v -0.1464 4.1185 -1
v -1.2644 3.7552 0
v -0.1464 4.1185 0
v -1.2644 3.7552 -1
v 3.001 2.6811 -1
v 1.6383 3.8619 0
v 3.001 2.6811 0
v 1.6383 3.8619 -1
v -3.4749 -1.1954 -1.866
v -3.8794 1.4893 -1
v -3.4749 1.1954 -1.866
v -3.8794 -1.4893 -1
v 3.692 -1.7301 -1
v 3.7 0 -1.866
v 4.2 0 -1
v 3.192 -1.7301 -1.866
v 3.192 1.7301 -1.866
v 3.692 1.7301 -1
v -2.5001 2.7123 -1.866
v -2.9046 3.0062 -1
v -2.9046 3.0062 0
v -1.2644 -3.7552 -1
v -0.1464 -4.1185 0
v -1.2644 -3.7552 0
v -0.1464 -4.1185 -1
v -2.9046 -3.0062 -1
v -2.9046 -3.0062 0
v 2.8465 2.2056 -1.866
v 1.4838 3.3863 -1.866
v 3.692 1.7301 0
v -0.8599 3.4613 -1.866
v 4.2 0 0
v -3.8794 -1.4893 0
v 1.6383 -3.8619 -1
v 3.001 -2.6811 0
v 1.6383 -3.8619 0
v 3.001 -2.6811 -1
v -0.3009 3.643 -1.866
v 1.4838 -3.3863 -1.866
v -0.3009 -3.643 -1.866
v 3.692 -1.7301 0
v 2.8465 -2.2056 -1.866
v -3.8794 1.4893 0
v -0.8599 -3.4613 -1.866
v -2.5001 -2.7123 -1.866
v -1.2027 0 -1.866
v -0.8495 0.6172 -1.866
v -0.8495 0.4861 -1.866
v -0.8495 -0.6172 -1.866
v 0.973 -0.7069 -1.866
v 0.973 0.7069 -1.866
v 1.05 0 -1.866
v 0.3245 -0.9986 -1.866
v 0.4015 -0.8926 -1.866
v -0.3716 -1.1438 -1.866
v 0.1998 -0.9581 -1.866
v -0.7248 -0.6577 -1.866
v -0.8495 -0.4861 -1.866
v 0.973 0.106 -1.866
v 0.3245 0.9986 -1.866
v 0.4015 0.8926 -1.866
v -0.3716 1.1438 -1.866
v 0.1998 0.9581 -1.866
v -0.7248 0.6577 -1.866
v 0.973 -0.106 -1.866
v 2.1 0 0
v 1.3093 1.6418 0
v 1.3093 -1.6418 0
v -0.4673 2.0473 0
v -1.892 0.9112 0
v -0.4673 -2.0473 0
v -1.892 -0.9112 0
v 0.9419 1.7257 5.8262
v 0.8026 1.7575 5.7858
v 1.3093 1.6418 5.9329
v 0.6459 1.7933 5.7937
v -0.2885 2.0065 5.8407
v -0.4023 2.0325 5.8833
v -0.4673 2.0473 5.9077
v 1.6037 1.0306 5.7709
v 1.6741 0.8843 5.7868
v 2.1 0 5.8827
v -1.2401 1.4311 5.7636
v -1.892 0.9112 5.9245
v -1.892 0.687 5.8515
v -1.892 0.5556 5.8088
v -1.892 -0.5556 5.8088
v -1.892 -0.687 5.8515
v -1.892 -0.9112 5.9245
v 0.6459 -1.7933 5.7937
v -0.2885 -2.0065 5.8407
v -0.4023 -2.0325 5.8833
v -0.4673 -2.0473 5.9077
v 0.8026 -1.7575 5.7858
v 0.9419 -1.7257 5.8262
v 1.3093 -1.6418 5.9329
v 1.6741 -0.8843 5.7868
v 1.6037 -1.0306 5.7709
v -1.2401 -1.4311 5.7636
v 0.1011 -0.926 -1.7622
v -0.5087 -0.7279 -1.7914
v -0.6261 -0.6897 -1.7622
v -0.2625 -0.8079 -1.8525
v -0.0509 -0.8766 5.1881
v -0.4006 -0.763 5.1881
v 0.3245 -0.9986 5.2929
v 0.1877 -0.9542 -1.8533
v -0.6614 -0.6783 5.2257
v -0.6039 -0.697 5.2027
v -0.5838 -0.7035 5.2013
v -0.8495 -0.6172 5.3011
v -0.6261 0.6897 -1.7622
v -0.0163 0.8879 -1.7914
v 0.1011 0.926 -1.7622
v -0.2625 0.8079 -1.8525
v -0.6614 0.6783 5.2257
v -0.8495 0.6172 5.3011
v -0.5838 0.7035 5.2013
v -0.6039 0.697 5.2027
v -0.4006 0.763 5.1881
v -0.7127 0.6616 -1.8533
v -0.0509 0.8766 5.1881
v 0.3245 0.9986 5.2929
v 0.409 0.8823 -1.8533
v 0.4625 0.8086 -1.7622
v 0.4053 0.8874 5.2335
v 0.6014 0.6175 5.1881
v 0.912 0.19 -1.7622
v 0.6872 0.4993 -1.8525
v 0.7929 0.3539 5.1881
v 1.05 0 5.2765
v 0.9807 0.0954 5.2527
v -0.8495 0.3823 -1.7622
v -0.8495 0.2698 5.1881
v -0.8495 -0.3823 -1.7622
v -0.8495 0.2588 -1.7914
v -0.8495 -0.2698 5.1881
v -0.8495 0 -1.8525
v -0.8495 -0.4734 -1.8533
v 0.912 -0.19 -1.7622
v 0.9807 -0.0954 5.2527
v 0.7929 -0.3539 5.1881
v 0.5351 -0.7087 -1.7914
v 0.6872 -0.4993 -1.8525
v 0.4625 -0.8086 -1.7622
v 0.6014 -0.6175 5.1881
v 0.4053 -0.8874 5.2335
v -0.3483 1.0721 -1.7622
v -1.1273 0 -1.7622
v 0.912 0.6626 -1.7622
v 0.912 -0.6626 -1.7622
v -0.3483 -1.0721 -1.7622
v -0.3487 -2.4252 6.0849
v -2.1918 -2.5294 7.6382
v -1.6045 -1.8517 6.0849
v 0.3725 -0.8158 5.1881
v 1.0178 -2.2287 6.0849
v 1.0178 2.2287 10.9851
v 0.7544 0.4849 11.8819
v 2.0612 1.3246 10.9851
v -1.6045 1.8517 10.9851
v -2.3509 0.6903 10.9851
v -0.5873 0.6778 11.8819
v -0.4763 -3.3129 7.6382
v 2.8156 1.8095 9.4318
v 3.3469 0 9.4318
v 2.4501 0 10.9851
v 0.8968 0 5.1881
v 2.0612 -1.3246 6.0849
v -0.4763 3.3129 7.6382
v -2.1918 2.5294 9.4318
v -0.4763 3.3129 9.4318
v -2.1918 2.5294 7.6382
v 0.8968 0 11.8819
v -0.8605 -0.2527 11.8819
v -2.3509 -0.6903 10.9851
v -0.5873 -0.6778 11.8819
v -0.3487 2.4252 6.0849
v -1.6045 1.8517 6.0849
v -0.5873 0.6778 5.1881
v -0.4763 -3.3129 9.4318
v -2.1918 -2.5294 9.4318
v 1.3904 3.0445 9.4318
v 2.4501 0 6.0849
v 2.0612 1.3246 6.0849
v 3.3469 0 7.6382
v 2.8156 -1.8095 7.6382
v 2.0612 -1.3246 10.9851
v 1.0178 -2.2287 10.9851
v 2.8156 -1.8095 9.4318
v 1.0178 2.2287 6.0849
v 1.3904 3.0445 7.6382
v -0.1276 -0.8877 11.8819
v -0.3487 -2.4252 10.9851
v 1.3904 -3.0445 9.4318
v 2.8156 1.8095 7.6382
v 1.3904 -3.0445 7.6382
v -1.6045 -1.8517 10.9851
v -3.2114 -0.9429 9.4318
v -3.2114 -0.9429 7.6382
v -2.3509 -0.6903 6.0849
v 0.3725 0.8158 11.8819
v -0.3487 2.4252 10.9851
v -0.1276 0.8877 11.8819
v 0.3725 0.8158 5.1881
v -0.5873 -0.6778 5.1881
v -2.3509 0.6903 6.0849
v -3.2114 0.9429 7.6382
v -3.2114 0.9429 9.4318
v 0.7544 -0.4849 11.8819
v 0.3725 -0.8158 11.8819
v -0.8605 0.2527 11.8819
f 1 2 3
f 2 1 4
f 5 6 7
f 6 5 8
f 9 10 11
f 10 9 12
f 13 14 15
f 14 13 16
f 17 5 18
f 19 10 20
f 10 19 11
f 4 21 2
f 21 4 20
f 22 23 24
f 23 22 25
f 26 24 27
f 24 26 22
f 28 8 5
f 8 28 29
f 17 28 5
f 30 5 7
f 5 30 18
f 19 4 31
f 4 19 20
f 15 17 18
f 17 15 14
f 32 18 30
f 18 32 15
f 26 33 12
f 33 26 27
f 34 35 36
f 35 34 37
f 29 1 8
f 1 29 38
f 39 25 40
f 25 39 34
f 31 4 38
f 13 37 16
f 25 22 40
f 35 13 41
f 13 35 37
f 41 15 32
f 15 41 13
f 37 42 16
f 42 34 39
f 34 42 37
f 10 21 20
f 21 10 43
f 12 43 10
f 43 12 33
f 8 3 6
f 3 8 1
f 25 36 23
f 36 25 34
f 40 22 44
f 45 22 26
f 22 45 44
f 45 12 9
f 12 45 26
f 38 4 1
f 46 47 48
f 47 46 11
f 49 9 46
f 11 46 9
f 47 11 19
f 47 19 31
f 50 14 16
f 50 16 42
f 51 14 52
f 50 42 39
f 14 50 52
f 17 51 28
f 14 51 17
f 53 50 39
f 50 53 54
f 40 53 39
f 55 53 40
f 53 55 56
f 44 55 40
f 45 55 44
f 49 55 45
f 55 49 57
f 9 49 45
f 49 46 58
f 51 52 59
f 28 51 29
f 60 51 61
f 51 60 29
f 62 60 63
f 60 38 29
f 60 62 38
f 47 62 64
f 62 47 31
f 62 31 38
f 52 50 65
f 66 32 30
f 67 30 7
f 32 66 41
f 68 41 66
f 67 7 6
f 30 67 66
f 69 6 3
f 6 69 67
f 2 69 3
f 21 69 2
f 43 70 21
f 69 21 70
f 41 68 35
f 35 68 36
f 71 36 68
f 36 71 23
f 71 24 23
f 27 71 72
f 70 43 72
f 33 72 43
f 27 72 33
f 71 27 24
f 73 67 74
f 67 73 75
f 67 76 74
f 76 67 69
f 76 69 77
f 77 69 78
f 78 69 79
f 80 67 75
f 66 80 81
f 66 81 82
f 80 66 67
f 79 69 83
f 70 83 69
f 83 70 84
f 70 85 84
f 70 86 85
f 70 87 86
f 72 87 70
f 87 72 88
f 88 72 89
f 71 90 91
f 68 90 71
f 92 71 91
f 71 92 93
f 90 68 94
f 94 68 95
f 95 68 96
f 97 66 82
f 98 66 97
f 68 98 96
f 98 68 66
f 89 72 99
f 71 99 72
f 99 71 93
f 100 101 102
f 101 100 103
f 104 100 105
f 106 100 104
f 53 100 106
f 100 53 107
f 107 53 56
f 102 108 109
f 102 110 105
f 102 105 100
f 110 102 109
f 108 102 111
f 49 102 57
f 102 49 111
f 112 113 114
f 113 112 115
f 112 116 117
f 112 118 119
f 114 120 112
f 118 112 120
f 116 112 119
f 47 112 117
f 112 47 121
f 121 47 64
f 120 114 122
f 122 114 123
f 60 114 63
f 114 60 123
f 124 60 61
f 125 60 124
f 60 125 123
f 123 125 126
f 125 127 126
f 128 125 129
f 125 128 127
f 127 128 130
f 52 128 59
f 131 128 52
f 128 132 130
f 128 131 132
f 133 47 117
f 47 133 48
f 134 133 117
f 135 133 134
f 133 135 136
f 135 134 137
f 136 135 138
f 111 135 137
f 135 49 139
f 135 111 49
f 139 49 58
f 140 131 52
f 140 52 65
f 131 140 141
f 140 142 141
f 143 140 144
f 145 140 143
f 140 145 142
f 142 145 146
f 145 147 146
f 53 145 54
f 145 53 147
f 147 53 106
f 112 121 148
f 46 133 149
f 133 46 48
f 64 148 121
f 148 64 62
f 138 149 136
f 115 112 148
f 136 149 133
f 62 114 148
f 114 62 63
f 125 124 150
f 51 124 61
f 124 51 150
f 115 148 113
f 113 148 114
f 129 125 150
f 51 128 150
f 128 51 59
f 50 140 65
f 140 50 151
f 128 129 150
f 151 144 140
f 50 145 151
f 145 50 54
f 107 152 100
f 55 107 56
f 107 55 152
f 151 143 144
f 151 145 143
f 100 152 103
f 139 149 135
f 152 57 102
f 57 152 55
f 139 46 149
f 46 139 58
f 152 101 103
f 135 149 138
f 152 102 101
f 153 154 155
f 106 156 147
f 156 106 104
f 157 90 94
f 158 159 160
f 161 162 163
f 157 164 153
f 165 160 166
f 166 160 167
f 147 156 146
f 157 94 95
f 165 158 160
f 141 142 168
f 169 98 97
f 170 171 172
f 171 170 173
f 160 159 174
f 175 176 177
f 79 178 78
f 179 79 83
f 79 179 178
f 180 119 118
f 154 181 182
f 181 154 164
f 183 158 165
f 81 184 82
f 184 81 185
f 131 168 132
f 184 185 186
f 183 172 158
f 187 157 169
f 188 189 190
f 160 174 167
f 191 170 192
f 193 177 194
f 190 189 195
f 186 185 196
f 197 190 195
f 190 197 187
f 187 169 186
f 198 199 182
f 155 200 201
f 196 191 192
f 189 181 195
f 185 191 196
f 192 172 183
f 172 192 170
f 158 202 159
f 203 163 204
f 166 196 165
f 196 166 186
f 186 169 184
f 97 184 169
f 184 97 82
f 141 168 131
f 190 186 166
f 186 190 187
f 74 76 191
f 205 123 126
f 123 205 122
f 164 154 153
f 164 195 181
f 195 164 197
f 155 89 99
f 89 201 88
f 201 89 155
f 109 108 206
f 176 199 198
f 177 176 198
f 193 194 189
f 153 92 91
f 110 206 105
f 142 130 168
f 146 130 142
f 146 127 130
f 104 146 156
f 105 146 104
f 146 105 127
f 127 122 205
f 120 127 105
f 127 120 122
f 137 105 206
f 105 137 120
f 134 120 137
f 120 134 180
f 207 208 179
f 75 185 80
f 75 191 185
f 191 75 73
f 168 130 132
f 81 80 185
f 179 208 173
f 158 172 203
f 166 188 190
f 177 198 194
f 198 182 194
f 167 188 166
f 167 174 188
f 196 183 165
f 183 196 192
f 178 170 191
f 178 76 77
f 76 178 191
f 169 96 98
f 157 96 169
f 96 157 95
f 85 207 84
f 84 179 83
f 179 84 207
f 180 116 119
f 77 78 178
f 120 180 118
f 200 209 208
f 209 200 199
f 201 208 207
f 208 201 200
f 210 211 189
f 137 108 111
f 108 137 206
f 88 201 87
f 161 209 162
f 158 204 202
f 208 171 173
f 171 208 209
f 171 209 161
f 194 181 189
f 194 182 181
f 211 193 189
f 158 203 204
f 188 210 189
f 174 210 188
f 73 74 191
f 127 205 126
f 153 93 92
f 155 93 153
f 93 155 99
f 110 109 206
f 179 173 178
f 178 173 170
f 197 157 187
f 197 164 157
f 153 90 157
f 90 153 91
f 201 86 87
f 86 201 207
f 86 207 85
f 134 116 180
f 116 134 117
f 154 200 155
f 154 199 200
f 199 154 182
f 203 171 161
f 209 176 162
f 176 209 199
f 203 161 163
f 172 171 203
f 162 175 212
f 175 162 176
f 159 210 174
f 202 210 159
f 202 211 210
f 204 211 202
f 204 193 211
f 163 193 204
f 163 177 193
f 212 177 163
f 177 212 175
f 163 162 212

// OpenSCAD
module rivet(diameter=4, length=10, materialcolor="silver") {
    radius= diameter / 2;
    color(materialcolor)
   render() union() { 
        difference() {
            difference() {    
                union() {
                    cylinder(r=radius, h=length-radius);
                    
                    
                    // head
                    difference() {
                    
                        translate([0,0,-1]) minkowski() {
                            sphere(1);
                            cylinder(r=diameter-1, h=1);
                            
                        };
                        cylinder(r=1.5*diameter, h=2);
                    };
    
                };
                translate([0,0,-2])
                    cylinder(r=radius*0.5, h=length-diameter);
            };
            translate([0,0,-2]) rotate_extrude() {
                        translate([radius*0.5,0,0])
                        circle(r=0.25);
            };
        };
        translate([0,0,length-radius*1.65]) sphere(r=radius*1.65);
    };
}

rivet(diameter=4.2, length=12);
